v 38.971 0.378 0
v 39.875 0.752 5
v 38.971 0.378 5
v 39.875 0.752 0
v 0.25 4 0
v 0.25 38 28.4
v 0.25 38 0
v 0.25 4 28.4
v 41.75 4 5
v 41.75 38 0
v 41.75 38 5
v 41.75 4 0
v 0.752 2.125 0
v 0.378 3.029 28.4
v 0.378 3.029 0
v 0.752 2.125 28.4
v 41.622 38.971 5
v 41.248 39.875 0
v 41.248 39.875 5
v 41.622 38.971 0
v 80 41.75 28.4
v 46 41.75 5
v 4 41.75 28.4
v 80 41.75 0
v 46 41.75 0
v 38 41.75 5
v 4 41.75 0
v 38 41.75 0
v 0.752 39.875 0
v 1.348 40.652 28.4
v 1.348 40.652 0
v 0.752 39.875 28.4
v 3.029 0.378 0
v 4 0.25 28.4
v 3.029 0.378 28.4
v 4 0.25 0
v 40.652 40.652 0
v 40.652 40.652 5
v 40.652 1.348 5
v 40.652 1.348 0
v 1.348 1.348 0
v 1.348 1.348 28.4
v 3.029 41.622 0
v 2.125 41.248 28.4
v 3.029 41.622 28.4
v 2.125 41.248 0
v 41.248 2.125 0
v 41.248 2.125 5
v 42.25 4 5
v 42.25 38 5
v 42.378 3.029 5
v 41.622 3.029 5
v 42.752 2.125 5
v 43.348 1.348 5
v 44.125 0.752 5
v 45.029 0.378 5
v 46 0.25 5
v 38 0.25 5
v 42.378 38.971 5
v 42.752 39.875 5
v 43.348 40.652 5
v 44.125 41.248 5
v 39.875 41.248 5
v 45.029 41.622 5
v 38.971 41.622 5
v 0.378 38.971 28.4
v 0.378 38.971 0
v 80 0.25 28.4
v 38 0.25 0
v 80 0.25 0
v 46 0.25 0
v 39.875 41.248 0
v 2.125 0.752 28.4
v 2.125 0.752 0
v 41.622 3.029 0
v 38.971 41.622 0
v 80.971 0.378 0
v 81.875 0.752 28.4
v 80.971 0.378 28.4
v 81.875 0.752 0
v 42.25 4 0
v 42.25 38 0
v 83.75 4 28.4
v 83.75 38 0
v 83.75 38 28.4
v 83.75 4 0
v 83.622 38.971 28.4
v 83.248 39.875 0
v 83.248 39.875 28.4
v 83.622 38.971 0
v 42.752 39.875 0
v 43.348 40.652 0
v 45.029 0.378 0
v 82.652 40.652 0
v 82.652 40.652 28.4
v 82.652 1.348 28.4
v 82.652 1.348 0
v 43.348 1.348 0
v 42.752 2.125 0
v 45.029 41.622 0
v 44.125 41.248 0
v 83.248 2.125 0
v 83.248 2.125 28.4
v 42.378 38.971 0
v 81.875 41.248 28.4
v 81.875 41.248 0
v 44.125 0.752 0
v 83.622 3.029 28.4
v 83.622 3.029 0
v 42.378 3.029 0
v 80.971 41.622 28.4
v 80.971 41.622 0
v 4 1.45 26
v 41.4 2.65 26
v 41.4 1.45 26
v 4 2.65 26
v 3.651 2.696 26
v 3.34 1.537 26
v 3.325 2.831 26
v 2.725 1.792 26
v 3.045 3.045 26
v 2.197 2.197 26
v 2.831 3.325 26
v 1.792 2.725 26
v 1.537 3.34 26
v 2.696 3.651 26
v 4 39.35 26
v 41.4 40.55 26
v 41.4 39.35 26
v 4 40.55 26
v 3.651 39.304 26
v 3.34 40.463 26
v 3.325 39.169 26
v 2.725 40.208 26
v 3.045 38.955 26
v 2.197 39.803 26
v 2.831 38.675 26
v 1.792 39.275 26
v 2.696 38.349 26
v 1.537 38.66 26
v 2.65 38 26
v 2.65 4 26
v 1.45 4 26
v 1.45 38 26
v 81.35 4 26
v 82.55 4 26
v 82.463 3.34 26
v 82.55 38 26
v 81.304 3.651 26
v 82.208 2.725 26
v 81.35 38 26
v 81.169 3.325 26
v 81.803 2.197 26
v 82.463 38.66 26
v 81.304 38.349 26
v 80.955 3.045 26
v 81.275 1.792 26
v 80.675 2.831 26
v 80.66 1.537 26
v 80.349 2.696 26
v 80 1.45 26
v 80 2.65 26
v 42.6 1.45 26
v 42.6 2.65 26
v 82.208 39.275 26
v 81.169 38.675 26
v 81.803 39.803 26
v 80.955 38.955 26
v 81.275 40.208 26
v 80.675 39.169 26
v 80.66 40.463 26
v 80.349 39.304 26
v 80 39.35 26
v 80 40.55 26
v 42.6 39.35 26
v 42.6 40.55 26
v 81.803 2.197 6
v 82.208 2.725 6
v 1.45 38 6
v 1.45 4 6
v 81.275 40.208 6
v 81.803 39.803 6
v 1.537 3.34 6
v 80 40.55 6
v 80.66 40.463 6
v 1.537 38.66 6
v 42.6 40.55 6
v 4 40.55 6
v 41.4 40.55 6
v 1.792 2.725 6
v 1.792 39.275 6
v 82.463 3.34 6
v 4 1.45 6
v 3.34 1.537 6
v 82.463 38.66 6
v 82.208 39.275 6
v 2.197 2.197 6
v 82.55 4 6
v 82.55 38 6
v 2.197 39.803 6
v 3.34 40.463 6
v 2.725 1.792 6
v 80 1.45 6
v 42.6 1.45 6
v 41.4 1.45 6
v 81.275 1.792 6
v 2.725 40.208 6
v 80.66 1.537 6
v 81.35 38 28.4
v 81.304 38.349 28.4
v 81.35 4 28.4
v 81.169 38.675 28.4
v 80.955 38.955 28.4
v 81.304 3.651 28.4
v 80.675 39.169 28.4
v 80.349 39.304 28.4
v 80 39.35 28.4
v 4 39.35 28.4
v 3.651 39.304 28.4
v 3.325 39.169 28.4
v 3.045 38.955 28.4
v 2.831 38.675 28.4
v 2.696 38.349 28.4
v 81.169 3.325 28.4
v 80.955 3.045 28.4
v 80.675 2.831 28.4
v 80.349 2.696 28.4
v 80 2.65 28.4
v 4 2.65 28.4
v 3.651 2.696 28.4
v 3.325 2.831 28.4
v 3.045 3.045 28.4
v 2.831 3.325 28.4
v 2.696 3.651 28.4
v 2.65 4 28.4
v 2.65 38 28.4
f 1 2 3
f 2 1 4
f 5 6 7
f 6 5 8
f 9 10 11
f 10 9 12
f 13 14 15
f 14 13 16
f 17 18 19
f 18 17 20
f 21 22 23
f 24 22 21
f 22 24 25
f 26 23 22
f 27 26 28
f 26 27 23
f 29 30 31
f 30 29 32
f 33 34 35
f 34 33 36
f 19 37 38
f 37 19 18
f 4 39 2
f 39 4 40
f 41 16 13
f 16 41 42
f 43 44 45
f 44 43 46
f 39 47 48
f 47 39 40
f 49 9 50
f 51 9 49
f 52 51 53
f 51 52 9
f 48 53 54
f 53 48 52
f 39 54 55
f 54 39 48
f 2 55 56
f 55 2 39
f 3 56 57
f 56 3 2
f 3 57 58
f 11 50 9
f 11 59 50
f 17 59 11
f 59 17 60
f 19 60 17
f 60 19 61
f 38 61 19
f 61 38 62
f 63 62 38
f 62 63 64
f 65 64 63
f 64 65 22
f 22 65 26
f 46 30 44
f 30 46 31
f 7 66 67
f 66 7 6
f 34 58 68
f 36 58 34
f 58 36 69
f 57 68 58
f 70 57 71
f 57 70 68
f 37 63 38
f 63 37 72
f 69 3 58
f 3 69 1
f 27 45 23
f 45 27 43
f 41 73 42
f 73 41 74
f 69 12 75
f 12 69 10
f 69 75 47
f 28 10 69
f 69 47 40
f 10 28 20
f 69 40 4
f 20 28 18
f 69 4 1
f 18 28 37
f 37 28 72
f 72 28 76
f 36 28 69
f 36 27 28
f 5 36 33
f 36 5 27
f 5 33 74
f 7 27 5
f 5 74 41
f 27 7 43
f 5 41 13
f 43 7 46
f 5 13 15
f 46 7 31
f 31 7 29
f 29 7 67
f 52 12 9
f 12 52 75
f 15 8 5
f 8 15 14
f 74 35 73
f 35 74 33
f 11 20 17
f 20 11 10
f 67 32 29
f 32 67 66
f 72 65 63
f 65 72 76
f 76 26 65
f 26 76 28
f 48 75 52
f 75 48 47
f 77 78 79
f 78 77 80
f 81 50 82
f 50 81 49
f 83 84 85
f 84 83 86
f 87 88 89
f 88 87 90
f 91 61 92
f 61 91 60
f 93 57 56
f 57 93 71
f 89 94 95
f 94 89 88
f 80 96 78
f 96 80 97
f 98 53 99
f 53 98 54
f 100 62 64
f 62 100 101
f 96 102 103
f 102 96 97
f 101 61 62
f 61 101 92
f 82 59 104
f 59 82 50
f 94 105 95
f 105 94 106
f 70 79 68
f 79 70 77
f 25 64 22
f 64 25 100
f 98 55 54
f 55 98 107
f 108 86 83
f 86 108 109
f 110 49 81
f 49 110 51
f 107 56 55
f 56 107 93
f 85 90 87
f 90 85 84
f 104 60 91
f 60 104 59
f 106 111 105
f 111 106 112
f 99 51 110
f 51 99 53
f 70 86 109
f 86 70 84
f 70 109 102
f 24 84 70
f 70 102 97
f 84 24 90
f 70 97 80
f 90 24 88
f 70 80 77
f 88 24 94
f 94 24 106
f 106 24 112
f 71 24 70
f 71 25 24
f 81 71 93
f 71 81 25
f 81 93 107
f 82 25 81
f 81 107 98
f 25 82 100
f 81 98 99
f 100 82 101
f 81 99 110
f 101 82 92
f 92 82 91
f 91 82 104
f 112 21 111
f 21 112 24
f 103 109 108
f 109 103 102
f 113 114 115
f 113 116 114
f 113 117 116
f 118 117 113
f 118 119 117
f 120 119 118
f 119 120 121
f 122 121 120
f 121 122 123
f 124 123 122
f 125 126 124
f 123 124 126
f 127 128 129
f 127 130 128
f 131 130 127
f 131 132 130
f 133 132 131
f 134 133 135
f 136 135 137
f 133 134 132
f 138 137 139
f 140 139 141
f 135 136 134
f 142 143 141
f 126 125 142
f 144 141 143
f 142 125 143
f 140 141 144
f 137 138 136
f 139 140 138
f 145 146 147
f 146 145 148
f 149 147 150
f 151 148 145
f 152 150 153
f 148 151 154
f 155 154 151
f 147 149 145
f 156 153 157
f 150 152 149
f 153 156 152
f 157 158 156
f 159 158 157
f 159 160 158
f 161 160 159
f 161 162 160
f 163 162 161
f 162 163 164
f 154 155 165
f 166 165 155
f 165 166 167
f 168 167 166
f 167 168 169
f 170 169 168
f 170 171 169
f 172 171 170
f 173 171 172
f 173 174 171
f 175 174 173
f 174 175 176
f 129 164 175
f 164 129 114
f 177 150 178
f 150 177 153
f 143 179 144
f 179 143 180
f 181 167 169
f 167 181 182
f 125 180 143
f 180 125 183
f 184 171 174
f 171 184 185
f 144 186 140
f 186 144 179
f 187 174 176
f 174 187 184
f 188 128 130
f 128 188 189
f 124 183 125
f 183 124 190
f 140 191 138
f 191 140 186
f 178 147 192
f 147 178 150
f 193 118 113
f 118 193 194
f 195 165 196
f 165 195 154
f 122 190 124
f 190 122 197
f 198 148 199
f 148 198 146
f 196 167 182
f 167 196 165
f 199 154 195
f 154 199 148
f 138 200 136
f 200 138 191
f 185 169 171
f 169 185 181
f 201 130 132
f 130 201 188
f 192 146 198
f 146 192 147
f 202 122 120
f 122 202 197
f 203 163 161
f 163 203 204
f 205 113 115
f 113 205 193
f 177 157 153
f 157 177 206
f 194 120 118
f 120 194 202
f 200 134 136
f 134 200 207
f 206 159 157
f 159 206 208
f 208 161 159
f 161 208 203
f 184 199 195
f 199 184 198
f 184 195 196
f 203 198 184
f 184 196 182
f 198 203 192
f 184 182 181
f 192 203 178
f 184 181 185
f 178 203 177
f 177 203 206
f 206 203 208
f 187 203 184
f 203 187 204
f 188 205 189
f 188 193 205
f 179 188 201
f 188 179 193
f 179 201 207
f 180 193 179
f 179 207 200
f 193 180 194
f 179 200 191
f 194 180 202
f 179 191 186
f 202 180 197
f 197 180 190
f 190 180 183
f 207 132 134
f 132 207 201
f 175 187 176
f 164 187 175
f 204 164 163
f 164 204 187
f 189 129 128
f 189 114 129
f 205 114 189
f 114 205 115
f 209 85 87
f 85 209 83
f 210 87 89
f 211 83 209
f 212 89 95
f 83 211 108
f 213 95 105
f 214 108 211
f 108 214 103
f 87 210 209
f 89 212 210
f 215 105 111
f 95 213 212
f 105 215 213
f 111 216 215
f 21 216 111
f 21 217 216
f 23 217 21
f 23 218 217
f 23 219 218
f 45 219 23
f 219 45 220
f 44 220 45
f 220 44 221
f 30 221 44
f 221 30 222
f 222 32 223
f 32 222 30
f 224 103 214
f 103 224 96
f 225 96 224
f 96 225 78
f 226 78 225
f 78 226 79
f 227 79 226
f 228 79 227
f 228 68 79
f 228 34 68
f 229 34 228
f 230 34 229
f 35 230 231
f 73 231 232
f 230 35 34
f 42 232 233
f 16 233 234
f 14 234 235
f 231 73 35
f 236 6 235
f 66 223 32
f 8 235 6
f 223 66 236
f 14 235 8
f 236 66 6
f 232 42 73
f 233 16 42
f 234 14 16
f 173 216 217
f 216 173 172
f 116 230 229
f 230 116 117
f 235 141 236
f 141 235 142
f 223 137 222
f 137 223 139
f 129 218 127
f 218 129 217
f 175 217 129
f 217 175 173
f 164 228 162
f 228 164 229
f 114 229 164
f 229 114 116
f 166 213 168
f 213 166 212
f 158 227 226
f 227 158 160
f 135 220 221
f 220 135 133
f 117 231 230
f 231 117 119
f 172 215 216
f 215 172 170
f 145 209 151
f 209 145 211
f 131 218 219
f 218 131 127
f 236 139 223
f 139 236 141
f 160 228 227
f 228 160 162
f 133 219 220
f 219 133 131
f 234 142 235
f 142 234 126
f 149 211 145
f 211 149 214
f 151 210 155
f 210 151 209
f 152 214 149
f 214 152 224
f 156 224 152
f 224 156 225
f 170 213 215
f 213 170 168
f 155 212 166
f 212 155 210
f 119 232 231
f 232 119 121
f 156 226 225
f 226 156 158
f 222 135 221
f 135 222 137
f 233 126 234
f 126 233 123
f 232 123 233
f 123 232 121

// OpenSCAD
// file: modules/lip.scad
include <../constants.scad>
include <base.scad>

// The stacking lip on top of a bin's walls.
module lip(x, y) {
    difference() {
        rounded_block(x, y, lip_height, corner_radius);
        translate([wall * 2, wall * 2, -1]) rounded_block(x - 4 * wall, y - 4 * wall, lip_height + 2, corner_radius - 2 * wall);
    }
}
// file: modules/walls.scad
include <../constants.scad>
include <base.scad>

// A box of x × y × h mm with walls, a floor and dividers along x.
module walls(x, y, h, dividers = 0) {
    difference() {
        rounded_block(x, y, h, corner_radius);
        translate([wall, wall, floor_thickness]) rounded_block(x - 2 * wall, y - 2 * wall, h, corner_radius - wall);
    }
    if (dividers > 0)
        for (i = [1 : dividers])
            translate([i * x / (dividers + 1) - wall / 2, 0, 0]) cube([wall, y, h]);
}
// file: modules/base.scad
include <../constants.scad>

// One foot per grid square, under a bin of w × d squares.
module grid_base(w, d) {
    for (x = [0 : w - 1], y = [0 : d - 1])
        translate([x * grid_pitch + clearance / 2, y * grid_pitch + clearance / 2, 0])
            rounded_block(grid_pitch - clearance, grid_pitch - clearance, base_height, corner_radius);
}

module rounded_block(x, y, h, r) {
    hull()
        for (cx = [r, x - r], cy = [r, y - r])
            translate([cx, cy, 0]) cylinder(r = r, h = h, $fn = 24);
}
// file: constants.scad
// Sizes every part of a bin shares. Each file in modules/ includes this one, and the
// models include all of them, so it is included several times per render (as
// Gridfinity Extended's constants are): the case the app's include once is for.
grid_pitch = 42;
height_unit = 7;
clearance = 0.5;
wall = 1.2;
floor_thickness = 1.0;
corner_radius = 3.75;
base_height = 5;
lip_height = 2.4;
// file: modules/all.scad
include <../constants.scad>
include <base.scad>
include <walls.scad>
include <lip.scad>
// main file
// A bin on a grid: its feet, walls, dividers and a stacking lip.
include <modules/all.scad>

/* [General] */
// Width: grid units, or mm when the second number isn't 0
width = [2, 0]; //0.1
// Depth: grid units, or mm when the second number isn't 0
depth = [1, 0]; //0.1
// Height: 7 mm units, or mm when the second number isn't 0
height = [3, 0]; //0.1
// Dividers along the width
dividers = 1; // [0:1:5]

/* [Lip] */
// A lip so bins stack
stacking_lip = true;

/* [Model detail] */
$fa = 8;
$fs = 0.5;

function size(v, unit) = v[1] > 0 ? v[1] : v[0] * unit;

x = size(width, grid_pitch) - clearance;
y = size(depth, grid_pitch) - clearance;
h = size(height, height_unit);

grid_base(max(1, round(width[0])), max(1, round(depth[0])));
translate([clearance / 2, clearance / 2, base_height]) {
    walls(x, y, h, dividers);
    if (stacking_lip) translate([0, 0, h]) lip(x, y);
}
